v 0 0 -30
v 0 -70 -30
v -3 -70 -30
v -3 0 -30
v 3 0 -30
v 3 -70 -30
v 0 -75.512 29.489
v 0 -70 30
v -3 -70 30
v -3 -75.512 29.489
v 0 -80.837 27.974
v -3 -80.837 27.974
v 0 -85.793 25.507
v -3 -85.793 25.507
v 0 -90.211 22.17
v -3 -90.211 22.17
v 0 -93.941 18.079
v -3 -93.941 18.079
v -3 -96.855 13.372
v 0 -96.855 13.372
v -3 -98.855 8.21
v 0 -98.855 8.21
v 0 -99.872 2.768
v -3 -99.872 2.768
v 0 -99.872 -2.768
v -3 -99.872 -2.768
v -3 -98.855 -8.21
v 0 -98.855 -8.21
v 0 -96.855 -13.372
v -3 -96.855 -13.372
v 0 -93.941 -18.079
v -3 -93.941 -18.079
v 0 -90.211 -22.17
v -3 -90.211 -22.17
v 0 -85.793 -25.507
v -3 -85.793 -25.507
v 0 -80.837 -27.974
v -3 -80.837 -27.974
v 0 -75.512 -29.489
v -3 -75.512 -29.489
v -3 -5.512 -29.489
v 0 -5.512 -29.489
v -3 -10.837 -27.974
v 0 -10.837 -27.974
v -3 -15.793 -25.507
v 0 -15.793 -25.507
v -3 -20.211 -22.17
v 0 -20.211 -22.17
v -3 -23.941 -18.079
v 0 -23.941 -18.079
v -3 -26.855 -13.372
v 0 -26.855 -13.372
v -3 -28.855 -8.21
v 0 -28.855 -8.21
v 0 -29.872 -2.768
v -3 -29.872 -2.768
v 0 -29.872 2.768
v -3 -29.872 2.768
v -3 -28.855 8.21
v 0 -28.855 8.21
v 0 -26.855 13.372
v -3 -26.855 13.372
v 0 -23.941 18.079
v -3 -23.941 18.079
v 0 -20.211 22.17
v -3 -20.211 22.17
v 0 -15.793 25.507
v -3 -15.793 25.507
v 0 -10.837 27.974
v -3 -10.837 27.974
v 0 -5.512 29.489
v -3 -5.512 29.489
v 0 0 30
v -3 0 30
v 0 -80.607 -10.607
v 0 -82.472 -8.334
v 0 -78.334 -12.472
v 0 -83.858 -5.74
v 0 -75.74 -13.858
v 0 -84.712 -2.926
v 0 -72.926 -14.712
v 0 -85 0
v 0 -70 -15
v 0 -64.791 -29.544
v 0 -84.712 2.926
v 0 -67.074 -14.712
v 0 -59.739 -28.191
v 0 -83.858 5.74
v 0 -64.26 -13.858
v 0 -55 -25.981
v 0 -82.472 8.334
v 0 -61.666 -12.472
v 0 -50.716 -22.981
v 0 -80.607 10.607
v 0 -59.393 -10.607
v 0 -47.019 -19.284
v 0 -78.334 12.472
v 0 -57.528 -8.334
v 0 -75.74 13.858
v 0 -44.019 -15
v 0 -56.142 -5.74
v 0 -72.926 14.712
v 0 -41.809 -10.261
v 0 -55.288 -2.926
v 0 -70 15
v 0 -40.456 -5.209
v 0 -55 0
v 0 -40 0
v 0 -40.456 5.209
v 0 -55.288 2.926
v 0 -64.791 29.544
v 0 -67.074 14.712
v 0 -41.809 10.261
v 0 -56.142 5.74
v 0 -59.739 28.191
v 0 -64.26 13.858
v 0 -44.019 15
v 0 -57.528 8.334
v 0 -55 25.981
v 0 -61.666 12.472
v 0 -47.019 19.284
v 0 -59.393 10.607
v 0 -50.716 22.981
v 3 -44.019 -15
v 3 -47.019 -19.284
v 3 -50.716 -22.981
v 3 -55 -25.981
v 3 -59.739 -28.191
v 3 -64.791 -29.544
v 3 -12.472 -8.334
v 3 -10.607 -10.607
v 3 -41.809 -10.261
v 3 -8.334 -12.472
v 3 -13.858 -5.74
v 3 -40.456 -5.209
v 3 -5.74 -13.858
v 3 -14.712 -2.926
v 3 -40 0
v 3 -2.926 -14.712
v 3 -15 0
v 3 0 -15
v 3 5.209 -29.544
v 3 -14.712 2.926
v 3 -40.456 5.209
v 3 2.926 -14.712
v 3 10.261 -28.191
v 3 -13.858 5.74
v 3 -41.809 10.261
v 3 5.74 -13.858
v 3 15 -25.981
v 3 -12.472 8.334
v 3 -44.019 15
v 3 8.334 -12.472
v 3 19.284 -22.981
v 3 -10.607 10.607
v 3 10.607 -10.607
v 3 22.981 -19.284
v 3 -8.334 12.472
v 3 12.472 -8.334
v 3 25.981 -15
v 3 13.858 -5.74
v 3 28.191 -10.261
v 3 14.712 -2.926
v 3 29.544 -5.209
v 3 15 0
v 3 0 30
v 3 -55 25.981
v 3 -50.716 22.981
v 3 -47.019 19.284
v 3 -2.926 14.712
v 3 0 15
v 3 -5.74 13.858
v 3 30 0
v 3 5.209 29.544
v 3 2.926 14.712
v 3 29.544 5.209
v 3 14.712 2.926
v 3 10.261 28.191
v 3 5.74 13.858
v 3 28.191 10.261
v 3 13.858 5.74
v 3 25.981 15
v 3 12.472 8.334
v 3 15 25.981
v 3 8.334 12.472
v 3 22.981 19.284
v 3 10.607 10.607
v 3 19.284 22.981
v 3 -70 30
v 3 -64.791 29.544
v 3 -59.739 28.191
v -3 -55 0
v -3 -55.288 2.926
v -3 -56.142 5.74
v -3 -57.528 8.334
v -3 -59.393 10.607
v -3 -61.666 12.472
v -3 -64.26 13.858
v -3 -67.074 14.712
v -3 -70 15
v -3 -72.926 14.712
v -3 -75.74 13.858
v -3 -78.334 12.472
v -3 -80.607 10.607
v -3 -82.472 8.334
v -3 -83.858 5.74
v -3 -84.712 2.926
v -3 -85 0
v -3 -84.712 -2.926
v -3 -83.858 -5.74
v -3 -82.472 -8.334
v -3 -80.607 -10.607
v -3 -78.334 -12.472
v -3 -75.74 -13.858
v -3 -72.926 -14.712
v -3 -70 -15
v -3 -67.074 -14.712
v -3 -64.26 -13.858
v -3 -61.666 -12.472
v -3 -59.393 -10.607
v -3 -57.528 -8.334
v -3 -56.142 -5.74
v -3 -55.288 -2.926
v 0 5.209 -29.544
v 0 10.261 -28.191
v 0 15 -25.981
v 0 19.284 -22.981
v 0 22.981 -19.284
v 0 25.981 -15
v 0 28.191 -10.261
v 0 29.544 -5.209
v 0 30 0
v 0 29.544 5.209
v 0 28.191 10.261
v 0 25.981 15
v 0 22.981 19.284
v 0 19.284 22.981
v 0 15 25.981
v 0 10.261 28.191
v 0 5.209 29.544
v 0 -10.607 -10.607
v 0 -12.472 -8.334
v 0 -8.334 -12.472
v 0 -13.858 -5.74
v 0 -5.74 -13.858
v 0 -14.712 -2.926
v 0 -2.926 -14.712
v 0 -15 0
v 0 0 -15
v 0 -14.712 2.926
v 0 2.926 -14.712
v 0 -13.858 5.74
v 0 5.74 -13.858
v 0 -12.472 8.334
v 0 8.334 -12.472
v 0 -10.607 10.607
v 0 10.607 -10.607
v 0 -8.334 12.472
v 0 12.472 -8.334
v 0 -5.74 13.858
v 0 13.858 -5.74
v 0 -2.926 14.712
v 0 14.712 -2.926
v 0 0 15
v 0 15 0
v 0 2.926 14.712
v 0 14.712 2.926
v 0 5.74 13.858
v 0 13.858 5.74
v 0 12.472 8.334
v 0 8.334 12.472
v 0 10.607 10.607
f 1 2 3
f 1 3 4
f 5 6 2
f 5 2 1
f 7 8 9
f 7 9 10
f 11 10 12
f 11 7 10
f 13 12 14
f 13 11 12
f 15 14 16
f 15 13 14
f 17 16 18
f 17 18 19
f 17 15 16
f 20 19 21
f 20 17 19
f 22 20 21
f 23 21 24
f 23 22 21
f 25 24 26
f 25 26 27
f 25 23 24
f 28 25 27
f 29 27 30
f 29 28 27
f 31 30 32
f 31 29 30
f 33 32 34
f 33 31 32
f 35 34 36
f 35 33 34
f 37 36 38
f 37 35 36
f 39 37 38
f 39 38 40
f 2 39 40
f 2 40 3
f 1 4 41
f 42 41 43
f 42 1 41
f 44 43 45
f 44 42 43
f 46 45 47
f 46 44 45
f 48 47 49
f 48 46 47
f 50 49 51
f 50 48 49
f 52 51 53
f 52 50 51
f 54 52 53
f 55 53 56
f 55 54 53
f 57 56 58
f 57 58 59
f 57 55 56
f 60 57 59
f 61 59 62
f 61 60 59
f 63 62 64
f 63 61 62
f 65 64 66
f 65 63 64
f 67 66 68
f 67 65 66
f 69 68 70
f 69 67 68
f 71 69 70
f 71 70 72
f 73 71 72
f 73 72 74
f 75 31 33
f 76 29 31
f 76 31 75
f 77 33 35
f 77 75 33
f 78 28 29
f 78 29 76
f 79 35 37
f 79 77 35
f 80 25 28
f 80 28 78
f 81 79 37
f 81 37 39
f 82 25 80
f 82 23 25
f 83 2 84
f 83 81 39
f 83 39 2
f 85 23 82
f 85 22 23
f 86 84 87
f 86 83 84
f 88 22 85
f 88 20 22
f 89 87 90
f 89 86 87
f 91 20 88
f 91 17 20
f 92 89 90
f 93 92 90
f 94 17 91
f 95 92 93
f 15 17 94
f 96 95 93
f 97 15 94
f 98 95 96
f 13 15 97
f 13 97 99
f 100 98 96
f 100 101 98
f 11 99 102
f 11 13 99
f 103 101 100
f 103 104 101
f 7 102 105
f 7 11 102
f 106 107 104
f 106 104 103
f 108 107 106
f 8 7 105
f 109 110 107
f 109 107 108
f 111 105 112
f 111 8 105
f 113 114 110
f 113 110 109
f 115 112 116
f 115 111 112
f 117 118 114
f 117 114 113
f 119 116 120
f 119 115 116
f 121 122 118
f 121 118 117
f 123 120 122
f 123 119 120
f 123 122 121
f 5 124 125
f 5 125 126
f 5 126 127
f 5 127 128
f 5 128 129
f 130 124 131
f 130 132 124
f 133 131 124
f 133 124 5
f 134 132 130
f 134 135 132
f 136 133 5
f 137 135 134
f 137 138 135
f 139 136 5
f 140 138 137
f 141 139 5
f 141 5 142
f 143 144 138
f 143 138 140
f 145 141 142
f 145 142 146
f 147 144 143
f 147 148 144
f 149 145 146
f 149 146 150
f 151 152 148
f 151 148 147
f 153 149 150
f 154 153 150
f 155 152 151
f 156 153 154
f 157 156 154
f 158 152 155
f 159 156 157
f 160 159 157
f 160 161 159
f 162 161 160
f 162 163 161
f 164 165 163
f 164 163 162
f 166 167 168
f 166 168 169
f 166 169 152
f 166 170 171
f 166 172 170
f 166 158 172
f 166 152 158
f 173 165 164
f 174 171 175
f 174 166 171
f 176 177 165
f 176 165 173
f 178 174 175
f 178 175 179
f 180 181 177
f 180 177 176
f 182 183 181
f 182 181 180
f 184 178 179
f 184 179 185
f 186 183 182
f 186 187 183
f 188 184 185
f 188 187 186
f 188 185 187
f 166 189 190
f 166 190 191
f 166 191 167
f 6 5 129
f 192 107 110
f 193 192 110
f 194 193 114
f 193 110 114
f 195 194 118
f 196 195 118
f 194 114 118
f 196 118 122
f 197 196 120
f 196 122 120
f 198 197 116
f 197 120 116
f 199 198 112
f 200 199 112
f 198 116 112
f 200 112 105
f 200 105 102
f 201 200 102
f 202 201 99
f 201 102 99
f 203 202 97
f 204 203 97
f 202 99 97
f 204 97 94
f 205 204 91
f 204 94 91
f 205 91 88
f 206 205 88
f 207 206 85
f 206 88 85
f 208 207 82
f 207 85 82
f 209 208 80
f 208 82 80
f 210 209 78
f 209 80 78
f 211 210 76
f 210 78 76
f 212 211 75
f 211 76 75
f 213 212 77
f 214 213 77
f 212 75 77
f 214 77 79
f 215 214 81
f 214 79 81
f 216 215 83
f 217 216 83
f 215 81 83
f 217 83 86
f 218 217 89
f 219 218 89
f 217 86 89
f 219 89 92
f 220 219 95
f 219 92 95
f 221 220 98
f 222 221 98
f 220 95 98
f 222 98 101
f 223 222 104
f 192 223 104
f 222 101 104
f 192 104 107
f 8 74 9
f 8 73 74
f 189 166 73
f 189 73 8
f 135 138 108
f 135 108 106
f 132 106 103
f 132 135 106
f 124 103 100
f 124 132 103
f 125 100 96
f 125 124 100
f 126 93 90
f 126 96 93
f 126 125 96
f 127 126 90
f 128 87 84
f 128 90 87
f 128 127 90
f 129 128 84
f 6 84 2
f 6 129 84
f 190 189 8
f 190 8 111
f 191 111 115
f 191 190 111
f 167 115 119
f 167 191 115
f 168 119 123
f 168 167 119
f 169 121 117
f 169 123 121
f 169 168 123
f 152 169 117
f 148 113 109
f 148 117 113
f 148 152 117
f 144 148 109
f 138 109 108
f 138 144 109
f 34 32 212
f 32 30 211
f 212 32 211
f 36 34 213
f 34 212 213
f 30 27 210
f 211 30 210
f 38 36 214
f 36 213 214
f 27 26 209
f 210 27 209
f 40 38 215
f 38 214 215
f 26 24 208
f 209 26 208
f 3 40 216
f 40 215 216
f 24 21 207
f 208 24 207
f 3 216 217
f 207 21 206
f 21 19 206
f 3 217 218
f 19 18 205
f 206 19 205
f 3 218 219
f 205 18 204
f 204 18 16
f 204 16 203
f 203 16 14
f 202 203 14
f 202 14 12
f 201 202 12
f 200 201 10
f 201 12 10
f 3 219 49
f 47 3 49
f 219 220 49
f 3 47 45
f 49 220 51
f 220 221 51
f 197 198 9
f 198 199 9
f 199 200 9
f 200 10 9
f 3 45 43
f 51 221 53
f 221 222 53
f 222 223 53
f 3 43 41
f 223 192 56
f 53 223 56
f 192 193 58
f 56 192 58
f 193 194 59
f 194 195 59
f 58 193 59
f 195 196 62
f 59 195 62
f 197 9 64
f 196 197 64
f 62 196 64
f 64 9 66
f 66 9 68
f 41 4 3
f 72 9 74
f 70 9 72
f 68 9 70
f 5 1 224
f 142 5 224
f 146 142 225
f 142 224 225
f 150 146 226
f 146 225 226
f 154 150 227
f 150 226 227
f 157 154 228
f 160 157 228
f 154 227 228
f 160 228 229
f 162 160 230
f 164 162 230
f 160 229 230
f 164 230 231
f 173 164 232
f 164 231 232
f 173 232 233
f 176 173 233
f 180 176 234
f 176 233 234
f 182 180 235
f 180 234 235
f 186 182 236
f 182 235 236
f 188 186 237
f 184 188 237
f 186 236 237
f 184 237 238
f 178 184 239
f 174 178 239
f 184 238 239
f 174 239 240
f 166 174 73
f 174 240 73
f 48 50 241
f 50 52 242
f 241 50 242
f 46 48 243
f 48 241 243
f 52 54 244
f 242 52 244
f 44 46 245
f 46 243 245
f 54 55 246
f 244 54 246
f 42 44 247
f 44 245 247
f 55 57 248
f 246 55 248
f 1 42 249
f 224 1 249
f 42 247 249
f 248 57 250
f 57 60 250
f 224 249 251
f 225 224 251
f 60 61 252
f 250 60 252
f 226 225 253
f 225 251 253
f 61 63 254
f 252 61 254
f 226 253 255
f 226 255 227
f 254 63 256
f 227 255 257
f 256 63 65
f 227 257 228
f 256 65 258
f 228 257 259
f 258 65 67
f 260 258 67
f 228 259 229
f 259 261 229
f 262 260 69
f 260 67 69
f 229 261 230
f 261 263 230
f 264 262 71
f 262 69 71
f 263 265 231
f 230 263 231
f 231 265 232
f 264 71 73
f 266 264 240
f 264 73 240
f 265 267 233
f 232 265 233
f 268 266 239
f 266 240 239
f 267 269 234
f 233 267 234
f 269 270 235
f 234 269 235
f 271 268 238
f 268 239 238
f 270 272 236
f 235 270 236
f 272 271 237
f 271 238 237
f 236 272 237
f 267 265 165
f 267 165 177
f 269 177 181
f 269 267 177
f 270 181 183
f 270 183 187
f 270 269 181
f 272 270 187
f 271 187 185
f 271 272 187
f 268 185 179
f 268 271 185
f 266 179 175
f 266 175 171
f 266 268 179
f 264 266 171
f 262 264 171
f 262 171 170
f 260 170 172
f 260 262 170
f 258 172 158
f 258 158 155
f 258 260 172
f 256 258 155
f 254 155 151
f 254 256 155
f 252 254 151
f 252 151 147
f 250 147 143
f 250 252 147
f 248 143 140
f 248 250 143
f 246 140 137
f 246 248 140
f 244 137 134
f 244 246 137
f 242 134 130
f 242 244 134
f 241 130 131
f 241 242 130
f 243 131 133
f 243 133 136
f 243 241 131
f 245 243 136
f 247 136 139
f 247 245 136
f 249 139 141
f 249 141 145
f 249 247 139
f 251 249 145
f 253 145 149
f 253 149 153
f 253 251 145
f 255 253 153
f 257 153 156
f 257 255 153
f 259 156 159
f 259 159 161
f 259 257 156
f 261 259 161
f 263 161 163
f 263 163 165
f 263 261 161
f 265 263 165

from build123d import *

# Parameters (mm, degrees)
F1_DEPTH      = 3
F1_DEPTH_BACK = 3
F0_R          = 15
F2_DEPTH      = 3
F3_DEPTH      = 3


with BuildPart() as f1:
    # F0 (on Right) → F1 (new body, two sides)
    with BuildSketch(Plane.YZ) as f1_sk:
        with BuildLine():
            ThreePointArc((-70, 30), (-48.786797, 21.213203), (-40, 0))
            ThreePointArc((-40, 0), (-48.786797, -21.213203), (-70, -30))
            Line((-70, -30), (0, -30))
            ThreePointArc((0, -30), (-30, 0), (0, 30))
            Line((0, 30), (-70, 30))
        make_face()
    extrude(amount=F1_DEPTH)
    extrude(f1_sk.sketch, amount=-F1_DEPTH_BACK)

    # F0 (on Right) → F2 (join)
    with BuildSketch(Plane.YZ):
        with BuildLine():
            ThreePointArc((30, 0), (21.213203, 21.213203), (0, 30))
            ThreePointArc((0, 30), (-30, 0), (0, -30))
            ThreePointArc((0, -30), (21.213203, -21.213203), (30, 0))
        make_face()
        Circle(F0_R, mode=Mode.SUBTRACT)
    extrude(amount=F2_DEPTH)

    # F0 (on Right) → F3 (join)
    with BuildSketch(Plane.YZ):
        with BuildLine():
            ThreePointArc((-70, -30), (-48.786797, -21.213203), (-40, 0))
            ThreePointArc((-40, 0), (-48.786797, 21.213203), (-70, 30))
            ThreePointArc((-70, 30), (-100, 0), (-70, -30))
        make_face()
        with Locations((-70, 0)):
            Circle(F0_R, mode=Mode.SUBTRACT)
    extrude(amount=-F3_DEPTH)


solid = f1.part
